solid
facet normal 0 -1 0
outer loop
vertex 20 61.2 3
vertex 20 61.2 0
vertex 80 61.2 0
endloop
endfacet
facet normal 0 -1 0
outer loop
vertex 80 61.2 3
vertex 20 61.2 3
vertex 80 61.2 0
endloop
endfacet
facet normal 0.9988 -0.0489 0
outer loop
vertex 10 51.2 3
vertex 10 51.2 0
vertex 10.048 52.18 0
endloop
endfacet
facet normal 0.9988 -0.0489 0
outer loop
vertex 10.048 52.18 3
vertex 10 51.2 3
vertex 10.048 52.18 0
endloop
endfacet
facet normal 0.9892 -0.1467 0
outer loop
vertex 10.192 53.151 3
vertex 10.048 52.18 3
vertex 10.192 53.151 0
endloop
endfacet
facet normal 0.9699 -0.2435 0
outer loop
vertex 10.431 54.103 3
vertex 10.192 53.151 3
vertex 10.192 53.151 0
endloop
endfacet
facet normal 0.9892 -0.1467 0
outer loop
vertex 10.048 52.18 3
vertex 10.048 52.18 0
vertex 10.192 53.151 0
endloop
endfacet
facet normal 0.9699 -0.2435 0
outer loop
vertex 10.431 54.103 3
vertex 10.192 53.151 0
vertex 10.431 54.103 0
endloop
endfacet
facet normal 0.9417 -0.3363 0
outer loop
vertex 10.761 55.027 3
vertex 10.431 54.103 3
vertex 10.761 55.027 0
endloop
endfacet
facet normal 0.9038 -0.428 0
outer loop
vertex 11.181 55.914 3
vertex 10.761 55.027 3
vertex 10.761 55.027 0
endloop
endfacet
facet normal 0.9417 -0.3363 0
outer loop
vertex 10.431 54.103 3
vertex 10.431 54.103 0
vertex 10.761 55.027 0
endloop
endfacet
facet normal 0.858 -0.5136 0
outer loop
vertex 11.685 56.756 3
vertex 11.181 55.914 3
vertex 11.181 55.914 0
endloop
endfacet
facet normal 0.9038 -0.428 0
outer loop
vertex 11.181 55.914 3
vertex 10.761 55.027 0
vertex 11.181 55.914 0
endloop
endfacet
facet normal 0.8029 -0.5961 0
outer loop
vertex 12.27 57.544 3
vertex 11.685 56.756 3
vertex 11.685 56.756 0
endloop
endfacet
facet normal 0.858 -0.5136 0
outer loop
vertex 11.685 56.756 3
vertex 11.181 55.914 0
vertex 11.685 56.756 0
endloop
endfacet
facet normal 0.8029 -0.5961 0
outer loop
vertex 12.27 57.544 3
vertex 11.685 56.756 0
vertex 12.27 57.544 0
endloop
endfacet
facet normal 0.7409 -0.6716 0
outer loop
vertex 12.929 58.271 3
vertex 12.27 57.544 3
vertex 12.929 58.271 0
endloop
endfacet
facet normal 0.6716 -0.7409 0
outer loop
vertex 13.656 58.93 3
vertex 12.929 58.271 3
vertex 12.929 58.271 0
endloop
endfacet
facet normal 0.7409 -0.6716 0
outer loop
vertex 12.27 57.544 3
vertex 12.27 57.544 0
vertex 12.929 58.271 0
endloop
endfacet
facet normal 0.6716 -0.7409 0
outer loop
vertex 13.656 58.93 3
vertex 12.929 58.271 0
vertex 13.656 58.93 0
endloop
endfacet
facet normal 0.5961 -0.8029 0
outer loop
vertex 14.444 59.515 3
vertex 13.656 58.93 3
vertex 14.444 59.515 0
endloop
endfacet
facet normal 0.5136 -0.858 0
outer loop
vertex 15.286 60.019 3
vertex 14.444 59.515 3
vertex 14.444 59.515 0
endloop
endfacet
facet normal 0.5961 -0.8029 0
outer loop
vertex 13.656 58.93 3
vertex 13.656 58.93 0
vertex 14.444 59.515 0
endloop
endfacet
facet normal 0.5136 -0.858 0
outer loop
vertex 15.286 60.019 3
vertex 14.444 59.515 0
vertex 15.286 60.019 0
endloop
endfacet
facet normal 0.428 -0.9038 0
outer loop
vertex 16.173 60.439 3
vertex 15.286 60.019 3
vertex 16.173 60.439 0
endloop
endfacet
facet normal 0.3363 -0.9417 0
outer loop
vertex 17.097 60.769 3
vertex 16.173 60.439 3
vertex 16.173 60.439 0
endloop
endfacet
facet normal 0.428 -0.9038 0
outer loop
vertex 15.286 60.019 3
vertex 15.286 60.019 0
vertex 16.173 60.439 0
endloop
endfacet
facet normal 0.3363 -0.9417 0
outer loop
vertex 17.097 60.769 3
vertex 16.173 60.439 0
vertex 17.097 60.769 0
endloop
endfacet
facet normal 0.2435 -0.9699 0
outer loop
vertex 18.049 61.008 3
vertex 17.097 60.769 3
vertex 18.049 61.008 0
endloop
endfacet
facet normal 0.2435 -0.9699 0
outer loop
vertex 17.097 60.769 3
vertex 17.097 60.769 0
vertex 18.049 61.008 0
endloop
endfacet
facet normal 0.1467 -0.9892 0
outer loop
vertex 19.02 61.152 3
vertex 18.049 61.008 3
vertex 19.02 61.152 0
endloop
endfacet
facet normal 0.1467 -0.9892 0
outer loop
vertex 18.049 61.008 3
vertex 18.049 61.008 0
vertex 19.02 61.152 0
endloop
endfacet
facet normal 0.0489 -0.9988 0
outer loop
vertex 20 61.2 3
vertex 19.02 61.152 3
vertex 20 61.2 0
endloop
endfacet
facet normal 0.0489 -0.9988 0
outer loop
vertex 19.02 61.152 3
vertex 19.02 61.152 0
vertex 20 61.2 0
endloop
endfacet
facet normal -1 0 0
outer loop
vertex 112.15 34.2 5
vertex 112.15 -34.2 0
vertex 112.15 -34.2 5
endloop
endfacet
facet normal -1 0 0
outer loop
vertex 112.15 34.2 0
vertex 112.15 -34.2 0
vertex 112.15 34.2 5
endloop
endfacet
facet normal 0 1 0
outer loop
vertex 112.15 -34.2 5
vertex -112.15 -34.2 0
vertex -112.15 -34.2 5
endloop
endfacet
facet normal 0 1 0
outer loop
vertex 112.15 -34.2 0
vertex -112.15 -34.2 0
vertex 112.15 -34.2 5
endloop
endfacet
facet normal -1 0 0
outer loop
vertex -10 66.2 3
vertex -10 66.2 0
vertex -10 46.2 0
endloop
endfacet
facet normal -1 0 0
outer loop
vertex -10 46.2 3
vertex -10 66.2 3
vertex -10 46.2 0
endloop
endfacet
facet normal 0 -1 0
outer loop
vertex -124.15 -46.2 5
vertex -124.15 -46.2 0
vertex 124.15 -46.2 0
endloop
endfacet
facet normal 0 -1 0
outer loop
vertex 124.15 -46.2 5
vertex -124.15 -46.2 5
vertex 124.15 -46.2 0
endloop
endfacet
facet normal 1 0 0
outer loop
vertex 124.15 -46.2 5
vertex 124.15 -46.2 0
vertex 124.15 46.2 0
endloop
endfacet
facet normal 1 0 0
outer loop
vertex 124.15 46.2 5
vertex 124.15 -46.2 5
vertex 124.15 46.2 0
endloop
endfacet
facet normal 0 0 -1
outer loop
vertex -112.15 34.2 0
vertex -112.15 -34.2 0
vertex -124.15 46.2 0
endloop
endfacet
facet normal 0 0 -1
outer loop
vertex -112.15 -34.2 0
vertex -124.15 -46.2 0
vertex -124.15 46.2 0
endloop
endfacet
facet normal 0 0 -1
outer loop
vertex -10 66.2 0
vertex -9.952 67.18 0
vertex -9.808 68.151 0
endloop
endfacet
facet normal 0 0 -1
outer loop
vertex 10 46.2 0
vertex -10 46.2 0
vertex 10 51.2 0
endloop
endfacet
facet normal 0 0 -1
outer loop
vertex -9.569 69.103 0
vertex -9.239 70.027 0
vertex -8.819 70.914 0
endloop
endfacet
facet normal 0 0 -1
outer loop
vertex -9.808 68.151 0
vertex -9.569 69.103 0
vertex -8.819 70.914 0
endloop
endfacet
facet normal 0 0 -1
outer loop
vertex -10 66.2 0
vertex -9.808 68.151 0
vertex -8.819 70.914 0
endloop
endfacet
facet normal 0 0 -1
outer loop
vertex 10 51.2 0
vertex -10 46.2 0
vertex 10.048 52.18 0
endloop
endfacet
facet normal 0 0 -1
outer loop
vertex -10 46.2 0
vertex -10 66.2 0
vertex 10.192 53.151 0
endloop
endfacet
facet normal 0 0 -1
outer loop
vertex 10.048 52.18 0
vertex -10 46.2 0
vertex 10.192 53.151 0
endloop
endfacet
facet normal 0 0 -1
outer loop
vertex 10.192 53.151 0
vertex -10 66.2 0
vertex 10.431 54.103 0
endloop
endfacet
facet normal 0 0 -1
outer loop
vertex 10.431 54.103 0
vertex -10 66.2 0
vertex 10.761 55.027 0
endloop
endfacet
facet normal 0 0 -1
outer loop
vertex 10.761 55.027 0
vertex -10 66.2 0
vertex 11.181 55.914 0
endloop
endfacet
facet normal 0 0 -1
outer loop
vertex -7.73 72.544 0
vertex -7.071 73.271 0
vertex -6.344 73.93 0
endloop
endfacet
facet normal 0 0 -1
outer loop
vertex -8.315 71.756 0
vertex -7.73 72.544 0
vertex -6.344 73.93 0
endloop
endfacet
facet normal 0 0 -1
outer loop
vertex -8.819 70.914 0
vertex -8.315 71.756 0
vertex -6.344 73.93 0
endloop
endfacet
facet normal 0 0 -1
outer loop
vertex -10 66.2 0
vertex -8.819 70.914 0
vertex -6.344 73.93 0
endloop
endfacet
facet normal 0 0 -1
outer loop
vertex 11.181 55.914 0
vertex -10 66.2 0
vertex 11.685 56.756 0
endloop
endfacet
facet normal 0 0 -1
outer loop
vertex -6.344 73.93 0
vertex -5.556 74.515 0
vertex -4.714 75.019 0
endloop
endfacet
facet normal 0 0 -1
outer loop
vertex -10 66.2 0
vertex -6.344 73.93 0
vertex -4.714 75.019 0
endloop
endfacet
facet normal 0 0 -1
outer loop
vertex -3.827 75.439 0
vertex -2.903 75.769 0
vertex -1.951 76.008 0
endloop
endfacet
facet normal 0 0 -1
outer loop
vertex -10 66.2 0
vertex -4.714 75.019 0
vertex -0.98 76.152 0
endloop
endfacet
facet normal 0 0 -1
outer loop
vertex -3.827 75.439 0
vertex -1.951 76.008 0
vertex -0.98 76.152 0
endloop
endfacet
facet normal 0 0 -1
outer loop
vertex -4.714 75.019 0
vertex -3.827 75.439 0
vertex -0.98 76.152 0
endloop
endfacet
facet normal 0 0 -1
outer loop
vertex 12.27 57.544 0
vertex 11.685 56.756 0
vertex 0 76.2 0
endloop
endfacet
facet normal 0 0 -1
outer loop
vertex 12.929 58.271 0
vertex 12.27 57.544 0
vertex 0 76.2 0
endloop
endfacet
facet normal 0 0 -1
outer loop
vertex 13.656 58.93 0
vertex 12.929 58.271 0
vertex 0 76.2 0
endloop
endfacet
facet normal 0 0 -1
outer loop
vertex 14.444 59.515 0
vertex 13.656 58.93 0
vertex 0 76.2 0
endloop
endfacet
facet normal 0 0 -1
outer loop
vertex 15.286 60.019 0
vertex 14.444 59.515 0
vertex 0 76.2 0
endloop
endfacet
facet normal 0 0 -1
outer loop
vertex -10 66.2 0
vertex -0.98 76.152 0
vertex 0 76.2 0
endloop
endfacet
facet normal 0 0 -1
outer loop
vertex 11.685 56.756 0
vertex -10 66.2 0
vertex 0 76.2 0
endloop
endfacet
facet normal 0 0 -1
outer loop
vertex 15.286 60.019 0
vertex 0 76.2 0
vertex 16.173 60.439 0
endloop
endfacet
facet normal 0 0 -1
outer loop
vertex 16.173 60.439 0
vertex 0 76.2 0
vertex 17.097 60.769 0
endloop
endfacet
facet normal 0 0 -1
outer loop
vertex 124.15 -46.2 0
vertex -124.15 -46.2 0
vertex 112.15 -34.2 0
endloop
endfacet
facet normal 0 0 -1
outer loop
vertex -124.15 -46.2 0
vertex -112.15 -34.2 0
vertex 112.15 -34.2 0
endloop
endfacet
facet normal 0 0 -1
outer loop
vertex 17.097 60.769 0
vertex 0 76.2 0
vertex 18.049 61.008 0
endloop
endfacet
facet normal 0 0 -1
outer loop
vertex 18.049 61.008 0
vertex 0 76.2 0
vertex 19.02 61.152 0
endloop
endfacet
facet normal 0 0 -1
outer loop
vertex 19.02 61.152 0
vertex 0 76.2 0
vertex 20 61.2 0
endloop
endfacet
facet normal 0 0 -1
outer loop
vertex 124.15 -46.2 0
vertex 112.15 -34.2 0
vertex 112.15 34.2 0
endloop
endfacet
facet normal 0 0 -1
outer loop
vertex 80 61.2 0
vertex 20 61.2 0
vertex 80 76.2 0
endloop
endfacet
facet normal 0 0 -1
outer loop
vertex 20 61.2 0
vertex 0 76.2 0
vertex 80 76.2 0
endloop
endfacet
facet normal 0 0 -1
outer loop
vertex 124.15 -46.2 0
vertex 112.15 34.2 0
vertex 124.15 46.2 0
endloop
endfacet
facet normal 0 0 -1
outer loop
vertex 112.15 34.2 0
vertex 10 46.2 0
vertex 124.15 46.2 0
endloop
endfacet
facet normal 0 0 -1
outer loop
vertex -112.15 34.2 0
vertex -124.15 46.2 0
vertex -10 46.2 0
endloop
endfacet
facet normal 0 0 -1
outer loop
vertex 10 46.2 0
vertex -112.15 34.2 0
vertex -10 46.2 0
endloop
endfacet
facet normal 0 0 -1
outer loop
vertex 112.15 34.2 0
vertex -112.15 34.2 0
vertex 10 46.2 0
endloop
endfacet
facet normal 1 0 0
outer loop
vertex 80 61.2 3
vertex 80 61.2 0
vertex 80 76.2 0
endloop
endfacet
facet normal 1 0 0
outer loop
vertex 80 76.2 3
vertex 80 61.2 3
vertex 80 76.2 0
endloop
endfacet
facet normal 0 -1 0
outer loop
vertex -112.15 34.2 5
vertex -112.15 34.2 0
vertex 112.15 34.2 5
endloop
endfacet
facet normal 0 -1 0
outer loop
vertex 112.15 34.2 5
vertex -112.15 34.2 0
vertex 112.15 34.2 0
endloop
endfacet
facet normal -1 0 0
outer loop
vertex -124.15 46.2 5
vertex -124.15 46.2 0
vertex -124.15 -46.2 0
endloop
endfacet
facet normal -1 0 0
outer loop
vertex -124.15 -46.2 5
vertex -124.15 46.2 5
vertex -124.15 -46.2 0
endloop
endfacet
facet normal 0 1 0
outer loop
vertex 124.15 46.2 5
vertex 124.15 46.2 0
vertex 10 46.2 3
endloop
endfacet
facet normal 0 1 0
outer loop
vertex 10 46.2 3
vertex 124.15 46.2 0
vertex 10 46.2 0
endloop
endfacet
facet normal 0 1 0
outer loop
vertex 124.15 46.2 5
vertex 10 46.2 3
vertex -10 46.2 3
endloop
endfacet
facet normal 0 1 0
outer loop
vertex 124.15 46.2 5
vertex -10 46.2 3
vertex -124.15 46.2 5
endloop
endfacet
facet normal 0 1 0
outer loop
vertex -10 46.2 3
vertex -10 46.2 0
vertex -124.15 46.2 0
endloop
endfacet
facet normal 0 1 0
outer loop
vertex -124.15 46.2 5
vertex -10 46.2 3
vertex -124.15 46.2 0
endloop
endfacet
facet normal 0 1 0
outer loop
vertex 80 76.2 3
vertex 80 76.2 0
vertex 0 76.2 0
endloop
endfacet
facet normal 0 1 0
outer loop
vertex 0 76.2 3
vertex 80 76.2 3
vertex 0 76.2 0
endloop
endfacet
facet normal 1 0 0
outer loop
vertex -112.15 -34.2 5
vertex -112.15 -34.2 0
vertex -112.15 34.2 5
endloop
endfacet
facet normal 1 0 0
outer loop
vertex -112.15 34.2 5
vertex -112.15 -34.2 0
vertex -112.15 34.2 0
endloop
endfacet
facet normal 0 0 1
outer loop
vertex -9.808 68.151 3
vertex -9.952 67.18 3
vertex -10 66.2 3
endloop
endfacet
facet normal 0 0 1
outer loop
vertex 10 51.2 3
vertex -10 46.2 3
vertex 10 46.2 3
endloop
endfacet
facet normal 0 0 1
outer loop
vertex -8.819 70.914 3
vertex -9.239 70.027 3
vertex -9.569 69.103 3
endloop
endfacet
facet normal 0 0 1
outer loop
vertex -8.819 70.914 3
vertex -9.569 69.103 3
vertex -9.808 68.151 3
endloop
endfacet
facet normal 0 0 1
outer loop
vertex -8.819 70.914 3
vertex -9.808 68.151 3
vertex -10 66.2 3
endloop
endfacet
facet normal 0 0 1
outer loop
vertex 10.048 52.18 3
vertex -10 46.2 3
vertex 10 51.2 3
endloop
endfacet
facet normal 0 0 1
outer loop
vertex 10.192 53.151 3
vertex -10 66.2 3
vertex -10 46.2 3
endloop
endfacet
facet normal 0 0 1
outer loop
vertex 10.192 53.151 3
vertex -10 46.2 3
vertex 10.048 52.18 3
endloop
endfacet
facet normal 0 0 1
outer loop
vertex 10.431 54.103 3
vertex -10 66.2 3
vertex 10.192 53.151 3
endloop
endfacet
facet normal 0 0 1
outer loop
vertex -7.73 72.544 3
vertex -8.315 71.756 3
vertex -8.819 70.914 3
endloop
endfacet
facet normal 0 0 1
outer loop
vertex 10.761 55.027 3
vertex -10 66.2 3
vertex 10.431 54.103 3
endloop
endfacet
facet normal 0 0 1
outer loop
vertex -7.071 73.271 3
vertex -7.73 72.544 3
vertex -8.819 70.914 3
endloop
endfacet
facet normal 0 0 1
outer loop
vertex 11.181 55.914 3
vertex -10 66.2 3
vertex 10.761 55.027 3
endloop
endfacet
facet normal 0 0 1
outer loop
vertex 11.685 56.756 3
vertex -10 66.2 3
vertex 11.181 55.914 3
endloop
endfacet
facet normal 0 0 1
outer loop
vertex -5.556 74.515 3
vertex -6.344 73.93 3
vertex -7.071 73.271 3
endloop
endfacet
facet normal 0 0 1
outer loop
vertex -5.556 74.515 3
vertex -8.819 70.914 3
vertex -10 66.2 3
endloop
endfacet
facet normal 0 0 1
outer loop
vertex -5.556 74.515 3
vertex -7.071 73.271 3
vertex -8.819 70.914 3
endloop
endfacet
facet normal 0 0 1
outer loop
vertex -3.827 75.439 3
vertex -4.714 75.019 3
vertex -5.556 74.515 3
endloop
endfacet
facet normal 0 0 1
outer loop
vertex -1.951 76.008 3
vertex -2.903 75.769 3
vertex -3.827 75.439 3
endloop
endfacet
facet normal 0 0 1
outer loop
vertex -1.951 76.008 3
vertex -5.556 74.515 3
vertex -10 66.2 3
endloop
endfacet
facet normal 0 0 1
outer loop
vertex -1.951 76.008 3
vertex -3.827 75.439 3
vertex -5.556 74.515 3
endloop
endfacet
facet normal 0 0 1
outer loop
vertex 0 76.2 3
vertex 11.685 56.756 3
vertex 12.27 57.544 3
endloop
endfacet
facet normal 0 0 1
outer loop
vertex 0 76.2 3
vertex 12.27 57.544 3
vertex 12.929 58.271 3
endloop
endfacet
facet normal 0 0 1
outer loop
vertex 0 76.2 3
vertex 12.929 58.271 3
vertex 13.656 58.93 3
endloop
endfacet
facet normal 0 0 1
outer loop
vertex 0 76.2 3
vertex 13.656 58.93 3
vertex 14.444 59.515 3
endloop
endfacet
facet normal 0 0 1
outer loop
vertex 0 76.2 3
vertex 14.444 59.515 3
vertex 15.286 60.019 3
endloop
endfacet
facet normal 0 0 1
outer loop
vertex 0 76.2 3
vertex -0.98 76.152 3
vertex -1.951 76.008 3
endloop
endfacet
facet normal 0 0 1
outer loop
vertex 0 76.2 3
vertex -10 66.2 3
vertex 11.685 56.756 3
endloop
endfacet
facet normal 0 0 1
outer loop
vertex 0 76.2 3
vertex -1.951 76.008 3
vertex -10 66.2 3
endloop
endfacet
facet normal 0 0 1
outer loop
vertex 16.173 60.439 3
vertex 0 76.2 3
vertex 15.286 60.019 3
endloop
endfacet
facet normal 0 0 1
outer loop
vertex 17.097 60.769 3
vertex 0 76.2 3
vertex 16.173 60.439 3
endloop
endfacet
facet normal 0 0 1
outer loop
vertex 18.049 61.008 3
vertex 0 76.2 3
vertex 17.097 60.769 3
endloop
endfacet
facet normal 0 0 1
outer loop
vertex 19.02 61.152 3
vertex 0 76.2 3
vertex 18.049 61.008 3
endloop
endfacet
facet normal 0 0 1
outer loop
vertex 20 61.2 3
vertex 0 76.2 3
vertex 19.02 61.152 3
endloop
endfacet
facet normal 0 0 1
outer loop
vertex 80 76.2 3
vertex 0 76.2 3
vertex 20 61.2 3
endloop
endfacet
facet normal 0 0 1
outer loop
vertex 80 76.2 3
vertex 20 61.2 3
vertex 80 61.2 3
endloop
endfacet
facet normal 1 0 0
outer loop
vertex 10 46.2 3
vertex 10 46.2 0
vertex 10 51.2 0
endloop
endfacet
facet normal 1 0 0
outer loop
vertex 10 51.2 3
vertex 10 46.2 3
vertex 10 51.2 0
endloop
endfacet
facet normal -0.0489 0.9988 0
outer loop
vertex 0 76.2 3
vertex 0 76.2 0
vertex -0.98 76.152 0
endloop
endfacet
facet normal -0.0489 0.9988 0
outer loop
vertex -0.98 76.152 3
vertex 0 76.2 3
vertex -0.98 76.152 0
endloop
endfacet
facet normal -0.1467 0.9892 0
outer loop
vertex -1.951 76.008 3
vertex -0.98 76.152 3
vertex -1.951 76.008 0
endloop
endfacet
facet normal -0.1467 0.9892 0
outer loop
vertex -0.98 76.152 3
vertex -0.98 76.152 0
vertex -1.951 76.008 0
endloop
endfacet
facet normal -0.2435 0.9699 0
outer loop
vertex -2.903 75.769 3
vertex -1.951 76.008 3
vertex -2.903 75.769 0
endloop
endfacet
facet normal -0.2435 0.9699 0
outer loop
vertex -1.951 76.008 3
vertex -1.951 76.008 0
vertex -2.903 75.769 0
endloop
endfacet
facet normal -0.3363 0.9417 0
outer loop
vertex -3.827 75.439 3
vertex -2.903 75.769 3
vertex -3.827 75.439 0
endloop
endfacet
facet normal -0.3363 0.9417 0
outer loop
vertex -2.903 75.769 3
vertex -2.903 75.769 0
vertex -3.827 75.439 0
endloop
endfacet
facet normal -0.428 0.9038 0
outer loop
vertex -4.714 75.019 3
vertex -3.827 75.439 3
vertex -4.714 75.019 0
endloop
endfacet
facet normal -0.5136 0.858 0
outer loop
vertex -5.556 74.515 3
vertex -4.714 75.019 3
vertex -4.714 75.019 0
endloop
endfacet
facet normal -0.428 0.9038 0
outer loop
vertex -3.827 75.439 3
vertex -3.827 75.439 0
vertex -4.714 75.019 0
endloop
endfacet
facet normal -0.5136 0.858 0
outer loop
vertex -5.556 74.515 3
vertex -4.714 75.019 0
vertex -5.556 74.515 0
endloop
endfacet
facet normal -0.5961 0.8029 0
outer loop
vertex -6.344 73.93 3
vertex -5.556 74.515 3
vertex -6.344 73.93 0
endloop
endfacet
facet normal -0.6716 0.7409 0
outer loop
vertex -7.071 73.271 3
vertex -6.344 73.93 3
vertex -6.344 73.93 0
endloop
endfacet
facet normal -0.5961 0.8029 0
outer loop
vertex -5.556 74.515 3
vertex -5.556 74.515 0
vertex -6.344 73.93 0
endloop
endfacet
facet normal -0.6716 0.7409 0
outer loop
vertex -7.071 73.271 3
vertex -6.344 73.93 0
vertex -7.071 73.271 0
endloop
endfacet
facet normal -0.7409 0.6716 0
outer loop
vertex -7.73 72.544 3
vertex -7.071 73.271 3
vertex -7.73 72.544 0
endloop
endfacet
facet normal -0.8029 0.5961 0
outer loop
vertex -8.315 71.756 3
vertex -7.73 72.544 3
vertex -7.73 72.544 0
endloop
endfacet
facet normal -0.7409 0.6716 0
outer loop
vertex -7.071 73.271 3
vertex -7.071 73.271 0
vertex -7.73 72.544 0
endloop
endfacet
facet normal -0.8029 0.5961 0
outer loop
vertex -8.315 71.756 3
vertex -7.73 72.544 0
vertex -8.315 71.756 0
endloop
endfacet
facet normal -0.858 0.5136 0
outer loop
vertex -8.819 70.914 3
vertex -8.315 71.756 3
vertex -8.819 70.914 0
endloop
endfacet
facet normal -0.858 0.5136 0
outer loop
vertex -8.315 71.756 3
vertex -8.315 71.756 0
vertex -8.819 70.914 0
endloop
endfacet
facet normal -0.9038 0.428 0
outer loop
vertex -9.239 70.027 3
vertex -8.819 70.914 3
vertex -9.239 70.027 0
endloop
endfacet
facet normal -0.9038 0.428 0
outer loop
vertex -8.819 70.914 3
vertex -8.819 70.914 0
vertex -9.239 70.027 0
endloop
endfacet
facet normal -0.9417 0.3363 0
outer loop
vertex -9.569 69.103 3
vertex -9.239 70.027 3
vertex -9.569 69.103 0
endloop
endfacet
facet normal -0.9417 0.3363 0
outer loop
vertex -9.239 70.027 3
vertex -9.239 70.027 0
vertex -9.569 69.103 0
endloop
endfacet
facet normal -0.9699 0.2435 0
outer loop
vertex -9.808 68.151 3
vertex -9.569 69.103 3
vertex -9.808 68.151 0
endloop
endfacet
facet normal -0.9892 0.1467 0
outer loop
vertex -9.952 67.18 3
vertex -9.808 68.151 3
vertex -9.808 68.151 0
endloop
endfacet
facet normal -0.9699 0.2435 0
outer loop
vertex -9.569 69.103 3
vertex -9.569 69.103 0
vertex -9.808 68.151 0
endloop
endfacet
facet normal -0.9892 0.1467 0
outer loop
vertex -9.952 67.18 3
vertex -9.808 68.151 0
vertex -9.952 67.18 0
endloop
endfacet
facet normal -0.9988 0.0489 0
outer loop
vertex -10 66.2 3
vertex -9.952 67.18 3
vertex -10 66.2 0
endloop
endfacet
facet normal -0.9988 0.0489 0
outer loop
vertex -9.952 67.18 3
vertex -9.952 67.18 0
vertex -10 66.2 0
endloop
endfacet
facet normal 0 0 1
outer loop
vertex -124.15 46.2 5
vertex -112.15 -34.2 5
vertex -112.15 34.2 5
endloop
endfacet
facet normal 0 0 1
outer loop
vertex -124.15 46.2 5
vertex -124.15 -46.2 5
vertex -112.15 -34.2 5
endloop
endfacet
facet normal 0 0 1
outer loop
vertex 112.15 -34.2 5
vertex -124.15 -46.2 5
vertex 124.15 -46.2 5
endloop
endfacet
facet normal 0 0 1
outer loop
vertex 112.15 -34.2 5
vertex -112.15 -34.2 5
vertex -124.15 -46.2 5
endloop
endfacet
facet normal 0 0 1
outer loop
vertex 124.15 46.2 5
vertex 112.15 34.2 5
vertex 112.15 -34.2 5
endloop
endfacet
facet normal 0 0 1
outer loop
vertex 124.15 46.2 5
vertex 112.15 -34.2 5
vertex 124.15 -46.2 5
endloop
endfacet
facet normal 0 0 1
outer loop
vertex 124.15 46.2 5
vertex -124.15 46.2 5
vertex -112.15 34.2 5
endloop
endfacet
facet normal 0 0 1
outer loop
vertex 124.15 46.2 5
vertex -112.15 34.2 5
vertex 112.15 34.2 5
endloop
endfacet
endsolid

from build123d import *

# Parameters (mm, degrees)
F0_W     = 224.3
F0_H     = 68.4
F1_DEPTH = 5
F2_DEPTH = 3


with BuildPart() as f1:
    # F0 (on Top) → F1 (new body)
    with BuildSketch(Plane.XY):
        Polygon((124.15, -46.2), (124.15, 46.2), (10, 46.2), (-10, 46.2), (-124.15, 46.2), (-124.15, -46.2), align=None)
        Rectangle(F0_W, F0_H, mode=Mode.SUBTRACT)
    extrude(amount=F1_DEPTH)

    # F0 (on Top) → F2 (join)
    with BuildSketch(Plane.XY):
        with BuildLine():
            Line((-10, 46.2), (10, 46.2))
            Line((10, 46.2), (10, 51.2))
            ThreePointArc((10, 51.2), (12.928932, 58.271068), (20, 61.2))
            Line((20, 61.2), (80, 61.2))
            Line((80, 61.2), (80, 76.2))
            Line((80, 76.2), (10, 76.2))
            Line((10, 76.2), (0, 76.2))
            ThreePointArc((0, 76.2), (-7.071068, 73.271068), (-10, 66.2))
            Line((-10, 66.2), (-10, 46.2))
        make_face()
    extrude(amount=F2_DEPTH)


solid = f1.part
